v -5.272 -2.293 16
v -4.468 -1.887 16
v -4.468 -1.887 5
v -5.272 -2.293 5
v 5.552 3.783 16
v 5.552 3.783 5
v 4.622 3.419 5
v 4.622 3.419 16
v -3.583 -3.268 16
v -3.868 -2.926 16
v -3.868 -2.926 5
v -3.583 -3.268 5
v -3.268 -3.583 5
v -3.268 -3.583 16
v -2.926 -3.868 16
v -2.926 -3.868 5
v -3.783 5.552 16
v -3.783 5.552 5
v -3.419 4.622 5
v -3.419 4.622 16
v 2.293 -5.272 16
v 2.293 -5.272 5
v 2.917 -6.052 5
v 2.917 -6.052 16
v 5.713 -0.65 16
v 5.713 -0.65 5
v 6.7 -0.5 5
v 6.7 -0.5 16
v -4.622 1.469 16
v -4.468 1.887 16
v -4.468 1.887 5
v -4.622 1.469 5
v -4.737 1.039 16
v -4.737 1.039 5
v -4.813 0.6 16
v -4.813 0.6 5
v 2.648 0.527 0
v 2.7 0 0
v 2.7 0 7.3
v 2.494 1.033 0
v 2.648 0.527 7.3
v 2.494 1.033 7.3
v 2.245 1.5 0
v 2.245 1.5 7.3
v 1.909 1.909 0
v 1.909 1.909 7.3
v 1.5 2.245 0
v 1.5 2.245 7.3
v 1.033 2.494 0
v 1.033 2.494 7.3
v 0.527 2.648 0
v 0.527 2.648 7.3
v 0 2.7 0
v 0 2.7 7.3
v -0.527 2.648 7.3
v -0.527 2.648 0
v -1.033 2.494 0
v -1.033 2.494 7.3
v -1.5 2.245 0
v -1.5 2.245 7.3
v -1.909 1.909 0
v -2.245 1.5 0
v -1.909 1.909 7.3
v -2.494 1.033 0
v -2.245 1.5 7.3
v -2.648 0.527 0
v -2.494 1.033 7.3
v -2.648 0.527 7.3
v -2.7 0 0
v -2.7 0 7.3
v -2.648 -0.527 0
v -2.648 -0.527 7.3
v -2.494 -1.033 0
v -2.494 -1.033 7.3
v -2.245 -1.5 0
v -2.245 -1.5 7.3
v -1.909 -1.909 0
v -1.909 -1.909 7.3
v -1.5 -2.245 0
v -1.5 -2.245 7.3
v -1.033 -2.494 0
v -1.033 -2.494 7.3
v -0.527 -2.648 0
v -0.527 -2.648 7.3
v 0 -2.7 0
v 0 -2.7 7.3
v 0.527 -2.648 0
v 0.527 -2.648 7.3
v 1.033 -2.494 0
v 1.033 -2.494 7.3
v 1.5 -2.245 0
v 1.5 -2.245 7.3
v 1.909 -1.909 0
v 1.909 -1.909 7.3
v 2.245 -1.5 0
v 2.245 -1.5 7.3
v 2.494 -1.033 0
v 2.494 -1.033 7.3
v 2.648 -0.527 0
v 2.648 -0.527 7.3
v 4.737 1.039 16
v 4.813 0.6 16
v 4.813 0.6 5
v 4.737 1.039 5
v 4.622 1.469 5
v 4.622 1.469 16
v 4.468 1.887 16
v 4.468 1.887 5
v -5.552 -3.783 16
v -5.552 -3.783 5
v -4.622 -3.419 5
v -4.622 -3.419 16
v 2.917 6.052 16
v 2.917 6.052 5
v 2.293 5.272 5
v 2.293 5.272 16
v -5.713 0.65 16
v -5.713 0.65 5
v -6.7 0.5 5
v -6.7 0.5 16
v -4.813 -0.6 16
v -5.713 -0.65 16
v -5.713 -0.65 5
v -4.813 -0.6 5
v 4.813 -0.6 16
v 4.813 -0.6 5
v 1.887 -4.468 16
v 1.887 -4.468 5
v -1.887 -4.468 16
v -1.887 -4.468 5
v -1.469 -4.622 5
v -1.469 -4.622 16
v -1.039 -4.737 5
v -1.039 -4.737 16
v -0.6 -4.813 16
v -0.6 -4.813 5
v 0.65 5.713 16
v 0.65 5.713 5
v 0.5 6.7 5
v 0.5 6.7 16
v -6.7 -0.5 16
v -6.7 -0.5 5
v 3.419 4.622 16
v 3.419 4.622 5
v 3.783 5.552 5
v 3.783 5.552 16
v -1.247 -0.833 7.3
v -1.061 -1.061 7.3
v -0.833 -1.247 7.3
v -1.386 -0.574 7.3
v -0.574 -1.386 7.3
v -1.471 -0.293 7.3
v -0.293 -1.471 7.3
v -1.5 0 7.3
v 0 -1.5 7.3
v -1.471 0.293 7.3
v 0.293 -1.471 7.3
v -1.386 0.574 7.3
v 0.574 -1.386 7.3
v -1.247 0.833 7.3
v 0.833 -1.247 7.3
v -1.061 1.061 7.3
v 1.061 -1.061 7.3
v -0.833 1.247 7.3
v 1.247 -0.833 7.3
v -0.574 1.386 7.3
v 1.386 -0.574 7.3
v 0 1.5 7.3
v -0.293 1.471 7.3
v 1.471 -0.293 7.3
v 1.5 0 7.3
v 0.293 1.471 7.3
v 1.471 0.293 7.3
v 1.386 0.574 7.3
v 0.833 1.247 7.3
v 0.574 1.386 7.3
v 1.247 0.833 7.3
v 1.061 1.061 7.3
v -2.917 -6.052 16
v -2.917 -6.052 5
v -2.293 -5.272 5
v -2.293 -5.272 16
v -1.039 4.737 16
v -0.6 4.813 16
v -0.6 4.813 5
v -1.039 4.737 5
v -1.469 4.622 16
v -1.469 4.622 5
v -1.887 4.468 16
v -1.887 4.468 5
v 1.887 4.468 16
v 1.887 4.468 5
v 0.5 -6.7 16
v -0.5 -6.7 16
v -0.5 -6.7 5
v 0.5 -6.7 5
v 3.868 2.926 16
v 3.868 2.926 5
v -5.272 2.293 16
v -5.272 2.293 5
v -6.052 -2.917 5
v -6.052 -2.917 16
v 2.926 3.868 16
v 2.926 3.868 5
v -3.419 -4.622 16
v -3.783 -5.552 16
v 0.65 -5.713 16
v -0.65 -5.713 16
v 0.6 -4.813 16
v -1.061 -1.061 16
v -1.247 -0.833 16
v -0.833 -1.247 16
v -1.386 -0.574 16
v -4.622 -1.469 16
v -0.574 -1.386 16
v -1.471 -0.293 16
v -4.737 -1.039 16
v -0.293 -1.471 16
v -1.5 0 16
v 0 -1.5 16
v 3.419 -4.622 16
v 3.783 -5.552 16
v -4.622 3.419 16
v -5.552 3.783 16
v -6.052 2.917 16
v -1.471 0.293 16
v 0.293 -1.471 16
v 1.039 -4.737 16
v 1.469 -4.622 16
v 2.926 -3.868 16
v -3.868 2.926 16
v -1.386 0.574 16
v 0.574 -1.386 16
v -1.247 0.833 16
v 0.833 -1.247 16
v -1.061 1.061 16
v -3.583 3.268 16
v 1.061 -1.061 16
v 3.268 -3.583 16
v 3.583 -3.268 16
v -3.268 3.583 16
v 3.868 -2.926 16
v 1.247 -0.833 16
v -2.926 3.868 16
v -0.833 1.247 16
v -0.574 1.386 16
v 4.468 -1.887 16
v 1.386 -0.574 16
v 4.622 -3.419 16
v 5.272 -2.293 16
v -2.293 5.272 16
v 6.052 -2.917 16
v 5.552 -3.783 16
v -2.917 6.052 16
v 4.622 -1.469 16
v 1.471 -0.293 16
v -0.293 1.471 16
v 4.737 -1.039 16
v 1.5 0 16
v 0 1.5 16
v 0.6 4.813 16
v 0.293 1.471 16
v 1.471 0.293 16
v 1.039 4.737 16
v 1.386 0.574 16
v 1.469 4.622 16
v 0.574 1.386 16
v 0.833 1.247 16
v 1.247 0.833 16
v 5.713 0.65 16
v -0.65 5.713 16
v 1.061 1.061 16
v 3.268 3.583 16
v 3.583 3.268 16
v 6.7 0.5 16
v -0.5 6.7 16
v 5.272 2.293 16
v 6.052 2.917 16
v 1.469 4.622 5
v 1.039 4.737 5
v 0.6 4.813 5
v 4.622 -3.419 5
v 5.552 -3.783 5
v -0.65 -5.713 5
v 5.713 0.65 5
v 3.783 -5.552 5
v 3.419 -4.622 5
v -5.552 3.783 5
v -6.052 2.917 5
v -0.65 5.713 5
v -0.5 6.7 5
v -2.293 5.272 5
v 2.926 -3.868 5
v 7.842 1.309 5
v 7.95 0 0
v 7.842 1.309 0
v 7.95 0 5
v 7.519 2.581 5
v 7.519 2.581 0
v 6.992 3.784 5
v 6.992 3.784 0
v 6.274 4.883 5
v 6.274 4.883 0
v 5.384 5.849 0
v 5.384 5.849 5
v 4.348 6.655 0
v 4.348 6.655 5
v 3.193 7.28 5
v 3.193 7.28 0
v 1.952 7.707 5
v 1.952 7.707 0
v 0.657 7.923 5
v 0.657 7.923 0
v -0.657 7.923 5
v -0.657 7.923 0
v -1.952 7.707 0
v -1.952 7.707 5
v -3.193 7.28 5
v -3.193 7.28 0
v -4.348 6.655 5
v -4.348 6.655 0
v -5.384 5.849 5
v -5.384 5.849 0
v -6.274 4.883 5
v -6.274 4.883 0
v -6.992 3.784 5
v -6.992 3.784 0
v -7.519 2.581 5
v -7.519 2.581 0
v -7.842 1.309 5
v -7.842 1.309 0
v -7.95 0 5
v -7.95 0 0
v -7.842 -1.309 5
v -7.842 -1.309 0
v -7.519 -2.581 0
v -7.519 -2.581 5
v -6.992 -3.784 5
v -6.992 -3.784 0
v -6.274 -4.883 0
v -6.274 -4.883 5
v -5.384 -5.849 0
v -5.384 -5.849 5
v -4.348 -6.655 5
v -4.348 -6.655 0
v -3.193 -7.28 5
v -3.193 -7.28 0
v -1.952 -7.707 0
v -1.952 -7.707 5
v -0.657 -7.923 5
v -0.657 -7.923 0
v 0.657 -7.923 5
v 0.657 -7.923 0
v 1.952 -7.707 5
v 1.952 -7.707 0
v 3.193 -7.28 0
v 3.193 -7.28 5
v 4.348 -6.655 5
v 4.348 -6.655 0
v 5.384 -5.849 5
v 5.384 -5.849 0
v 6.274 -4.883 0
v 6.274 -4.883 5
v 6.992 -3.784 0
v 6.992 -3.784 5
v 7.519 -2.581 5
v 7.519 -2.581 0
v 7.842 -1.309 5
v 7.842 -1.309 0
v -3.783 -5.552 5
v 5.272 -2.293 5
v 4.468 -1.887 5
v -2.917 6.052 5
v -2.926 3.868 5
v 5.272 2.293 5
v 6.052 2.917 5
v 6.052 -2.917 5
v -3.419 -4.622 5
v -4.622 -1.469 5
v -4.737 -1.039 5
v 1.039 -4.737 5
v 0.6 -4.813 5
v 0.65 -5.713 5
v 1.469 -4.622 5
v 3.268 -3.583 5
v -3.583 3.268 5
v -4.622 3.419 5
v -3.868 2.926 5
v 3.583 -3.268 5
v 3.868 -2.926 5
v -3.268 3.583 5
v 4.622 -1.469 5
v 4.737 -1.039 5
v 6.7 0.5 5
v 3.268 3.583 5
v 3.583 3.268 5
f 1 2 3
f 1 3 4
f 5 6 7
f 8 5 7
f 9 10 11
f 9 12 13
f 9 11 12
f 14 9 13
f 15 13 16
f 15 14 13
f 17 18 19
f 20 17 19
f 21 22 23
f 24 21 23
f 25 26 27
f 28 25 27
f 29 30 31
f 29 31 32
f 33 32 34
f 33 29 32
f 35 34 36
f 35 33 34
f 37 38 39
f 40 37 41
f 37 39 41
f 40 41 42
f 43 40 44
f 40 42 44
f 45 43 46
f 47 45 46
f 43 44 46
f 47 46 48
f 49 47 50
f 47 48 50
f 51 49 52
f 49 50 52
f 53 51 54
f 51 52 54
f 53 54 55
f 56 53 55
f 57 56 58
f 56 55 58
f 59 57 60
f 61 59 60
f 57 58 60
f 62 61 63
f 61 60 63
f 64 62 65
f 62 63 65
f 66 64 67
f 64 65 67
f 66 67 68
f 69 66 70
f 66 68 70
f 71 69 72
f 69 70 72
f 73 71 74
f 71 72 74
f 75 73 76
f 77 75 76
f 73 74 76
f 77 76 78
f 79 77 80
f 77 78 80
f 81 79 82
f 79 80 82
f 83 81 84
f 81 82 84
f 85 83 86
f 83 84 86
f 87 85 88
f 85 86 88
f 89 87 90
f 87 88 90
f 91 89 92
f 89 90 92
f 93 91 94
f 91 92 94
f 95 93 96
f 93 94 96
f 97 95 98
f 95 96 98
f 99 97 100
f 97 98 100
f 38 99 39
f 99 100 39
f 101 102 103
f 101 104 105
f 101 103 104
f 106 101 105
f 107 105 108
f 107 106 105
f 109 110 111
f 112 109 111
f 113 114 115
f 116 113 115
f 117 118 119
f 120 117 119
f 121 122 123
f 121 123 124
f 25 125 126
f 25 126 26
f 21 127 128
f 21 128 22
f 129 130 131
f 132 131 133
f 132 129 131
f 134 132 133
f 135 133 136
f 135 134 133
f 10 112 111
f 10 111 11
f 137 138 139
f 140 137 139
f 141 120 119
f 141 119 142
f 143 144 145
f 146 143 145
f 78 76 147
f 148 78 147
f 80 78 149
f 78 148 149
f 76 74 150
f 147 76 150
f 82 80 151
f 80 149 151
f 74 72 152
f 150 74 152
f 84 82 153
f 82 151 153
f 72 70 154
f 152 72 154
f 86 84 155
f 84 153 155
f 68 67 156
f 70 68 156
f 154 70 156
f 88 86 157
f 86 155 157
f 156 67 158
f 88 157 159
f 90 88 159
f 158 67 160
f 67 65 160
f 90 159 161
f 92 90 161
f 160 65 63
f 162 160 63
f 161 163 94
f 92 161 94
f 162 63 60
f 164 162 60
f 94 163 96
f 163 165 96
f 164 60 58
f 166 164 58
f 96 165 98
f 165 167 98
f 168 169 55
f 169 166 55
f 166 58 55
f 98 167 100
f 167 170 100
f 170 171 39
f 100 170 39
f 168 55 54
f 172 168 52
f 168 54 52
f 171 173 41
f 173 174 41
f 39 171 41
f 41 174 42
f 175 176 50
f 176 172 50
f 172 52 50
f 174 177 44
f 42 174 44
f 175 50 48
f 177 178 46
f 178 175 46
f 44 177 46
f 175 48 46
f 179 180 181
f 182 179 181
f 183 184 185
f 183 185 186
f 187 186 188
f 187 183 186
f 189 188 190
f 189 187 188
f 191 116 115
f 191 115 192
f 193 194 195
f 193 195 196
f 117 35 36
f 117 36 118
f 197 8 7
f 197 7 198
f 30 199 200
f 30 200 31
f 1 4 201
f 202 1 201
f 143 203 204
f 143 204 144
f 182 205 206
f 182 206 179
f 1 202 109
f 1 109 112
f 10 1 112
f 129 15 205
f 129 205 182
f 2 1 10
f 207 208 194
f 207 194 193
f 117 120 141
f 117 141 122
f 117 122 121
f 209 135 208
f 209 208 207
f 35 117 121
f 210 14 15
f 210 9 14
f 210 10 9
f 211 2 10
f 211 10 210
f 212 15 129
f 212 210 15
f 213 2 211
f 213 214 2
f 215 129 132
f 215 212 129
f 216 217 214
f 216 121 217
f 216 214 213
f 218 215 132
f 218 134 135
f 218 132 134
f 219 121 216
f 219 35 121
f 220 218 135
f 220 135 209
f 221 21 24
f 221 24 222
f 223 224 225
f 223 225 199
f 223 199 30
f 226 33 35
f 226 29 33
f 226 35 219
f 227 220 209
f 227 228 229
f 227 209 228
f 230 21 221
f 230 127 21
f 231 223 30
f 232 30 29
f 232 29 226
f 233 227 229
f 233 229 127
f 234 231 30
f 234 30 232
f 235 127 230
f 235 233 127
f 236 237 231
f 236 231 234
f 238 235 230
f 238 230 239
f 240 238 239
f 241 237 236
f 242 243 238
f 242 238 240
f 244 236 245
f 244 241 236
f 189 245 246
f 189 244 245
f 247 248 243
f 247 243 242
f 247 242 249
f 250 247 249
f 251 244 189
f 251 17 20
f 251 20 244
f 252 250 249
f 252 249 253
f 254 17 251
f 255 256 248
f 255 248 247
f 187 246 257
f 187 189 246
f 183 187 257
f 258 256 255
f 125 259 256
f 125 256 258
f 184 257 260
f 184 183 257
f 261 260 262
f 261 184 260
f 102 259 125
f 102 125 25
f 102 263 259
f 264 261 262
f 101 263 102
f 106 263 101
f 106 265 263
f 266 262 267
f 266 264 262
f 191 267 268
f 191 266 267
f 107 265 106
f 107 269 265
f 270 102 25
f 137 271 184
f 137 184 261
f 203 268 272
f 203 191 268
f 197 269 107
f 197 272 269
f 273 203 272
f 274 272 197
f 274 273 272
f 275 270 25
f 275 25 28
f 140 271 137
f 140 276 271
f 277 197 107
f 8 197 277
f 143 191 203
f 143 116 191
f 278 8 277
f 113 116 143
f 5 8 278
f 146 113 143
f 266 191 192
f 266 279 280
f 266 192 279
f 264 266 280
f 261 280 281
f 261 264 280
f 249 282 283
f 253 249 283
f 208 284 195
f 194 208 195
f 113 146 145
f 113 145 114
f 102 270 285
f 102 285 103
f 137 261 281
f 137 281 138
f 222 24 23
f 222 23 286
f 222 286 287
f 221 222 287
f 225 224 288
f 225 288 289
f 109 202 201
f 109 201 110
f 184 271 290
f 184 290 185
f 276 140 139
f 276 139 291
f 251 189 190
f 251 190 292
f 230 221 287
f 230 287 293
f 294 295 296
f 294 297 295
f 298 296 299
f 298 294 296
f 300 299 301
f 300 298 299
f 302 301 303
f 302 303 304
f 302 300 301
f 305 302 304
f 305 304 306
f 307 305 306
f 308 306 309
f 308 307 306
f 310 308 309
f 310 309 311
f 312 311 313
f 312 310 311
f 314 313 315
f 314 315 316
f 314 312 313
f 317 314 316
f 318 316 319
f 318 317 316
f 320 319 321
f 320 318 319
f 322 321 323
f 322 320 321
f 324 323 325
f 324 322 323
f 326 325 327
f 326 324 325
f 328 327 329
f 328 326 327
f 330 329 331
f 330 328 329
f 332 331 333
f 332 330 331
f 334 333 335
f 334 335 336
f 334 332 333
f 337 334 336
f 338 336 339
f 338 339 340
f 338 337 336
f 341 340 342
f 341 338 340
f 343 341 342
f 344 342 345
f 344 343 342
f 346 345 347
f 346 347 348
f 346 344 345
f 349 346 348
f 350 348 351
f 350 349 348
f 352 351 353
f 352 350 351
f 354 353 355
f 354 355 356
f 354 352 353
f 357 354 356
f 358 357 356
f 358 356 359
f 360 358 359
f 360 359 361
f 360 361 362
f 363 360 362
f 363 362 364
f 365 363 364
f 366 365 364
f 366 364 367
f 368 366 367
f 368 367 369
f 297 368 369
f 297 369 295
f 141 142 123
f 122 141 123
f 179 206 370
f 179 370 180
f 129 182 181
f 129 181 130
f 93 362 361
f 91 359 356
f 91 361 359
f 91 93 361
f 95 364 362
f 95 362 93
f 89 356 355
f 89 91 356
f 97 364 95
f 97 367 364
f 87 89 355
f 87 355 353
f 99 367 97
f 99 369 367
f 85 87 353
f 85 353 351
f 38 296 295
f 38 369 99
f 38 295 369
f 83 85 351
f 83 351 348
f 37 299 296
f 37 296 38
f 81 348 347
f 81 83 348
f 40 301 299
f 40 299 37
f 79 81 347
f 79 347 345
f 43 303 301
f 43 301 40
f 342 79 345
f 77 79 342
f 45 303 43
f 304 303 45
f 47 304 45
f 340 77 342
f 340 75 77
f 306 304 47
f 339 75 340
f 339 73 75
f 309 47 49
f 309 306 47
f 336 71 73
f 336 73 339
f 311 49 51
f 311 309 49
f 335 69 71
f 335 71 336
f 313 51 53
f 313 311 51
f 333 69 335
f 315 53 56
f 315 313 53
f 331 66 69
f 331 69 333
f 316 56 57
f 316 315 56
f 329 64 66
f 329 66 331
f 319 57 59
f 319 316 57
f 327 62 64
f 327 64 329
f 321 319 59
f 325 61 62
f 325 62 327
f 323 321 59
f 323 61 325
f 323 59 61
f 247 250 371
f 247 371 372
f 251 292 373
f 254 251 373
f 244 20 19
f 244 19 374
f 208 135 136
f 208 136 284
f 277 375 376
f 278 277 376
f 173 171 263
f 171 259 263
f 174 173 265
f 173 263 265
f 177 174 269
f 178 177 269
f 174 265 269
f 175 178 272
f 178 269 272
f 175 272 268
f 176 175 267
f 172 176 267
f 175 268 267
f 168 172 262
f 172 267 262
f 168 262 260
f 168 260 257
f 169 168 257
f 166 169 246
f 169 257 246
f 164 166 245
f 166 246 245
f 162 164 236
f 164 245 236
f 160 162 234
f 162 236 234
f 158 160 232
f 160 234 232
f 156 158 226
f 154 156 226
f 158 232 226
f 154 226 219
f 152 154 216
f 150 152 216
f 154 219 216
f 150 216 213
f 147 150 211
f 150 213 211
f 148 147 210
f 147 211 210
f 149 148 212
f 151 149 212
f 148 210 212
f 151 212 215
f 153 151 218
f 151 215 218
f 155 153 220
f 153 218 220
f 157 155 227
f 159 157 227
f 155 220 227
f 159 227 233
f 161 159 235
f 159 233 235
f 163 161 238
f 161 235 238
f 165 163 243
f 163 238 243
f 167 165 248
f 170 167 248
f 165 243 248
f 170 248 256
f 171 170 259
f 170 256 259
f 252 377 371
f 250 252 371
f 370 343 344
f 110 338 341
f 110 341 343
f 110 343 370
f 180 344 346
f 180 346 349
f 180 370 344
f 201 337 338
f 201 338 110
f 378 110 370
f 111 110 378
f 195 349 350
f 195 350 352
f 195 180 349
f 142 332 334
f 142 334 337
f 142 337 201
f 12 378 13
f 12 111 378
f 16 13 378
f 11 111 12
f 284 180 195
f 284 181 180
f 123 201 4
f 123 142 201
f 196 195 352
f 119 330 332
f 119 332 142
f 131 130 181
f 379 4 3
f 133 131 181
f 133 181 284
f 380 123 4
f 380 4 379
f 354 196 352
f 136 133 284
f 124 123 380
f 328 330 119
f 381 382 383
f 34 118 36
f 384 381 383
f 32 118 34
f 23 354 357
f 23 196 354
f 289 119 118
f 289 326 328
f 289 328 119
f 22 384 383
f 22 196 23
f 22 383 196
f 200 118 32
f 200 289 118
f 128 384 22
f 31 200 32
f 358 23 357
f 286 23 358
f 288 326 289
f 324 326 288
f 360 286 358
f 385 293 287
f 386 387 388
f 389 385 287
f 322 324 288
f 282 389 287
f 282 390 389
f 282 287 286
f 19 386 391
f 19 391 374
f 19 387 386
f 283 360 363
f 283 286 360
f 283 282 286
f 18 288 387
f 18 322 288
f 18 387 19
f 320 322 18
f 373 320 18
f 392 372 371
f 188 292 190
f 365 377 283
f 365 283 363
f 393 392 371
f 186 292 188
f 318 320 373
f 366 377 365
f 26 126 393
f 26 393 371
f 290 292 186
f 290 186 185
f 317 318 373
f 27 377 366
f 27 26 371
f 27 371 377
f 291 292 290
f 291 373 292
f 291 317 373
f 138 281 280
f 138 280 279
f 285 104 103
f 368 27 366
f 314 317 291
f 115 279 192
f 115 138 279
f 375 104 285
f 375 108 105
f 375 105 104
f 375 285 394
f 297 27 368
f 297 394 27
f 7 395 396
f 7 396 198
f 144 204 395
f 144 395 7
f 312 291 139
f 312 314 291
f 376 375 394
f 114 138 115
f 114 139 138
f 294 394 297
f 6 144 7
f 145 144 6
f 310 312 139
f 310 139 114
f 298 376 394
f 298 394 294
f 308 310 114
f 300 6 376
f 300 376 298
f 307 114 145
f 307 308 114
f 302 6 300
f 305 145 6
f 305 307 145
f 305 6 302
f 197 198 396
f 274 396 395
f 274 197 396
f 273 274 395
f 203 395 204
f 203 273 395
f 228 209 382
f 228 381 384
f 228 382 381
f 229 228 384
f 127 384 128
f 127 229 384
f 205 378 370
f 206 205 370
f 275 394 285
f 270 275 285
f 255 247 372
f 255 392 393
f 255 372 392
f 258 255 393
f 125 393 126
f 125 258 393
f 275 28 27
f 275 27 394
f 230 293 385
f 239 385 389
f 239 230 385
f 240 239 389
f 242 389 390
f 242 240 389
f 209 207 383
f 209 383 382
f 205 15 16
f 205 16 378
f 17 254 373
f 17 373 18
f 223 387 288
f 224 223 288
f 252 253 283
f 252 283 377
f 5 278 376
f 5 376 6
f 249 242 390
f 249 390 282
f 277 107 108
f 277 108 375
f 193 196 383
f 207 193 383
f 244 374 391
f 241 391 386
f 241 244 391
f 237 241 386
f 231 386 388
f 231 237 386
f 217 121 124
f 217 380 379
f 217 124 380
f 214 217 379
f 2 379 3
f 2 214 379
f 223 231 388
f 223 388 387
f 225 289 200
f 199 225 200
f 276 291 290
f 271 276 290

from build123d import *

# Parameters (mm, degrees)
F5_DEPTH        = 11
F5_COPIES_COUNT = 12


# Not quite as in the source:
# - a pattern or mirror of a feature is missing from the dataset's text; its kind, count and spacing are read off the source's solid


with BuildPart() as f1:
    # F0 (on Front) → F1 (revolve)
    with BuildSketch(Plane.XZ):
        Polygon((0, 16), (0, 0), (7.95, 0), (7.95, 5), (4.85, 5), (4.85, 16), align=None)
    revolve(axis=Axis((0, 0, 9.6948958626), (0, 0, 1)))

    # F2 (on Front) → F3 (revolve, cut)
    with BuildSketch(Plane.XZ):
        Polygon((0, 0), (2.7, 0), (2.7, 7.3), (1.5, 7.3), (1.5, 16), (0, 16), align=None)
    revolve(axis=Axis((0, 0, 9.4397878274), (0, 0, 1)), mode=Mode.SUBTRACT)

    # F4 (on face) → F5 (join, through all)
    with BuildSketch(Plane.XY.offset(16)):
        with BuildLine():
            Line((-0.65, 5.7127435003), (-0.6, 4.8127435003))
            ThreePointArc((-0.6, 4.8127435003), (0, 4.85), (0.6, 4.8127435003))
            Line((0.6, 4.8127435003), (0.65, 5.7127435003))
            Line((0.65, 5.7127435003), (0.5, 6.7))
            Line((0.5, 6.7), (-0.5, 6.7))
            Line((-0.5, 6.7), (-0.65, 5.7127435003))
        make_face()
    f5 = extrude(amount=-F5_DEPTH)

    # F5_copies: F5 ×12 about axis
    f5_copies_axis = Axis((0, 0, 0), (0, 0, 1))
    for i in range(1, F5_COPIES_COUNT):
        add(f5.rotate(f5_copies_axis, i * 360 / F5_COPIES_COUNT))


solid = f1.part
